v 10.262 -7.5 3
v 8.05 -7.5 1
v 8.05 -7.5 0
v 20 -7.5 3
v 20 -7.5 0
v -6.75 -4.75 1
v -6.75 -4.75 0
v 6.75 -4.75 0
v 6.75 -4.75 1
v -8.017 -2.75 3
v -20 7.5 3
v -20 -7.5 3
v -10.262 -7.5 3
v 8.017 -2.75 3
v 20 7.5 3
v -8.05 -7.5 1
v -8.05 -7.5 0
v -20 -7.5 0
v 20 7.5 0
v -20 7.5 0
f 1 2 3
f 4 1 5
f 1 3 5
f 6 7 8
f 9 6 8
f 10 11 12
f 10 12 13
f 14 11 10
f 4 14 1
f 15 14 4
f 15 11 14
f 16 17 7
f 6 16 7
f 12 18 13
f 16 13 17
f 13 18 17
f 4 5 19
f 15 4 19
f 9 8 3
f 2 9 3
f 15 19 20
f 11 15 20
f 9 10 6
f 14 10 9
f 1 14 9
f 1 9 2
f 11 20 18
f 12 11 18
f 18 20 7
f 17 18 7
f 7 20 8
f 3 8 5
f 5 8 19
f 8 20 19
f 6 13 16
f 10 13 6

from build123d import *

# Parameters (mm, degrees)
F1_DEPTH = 3
F2_SIZE  = 2


# Not quite as in the source:
# - a feature names something its author has since deleted; it is built from what else it names


with BuildPart() as f1:
    # F0 (on Top) → F1 (new body)
    with BuildSketch(Plane.XY):
        Polygon((8.05, -7.5), (20, -7.5), (20, 7.5), (-20, 7.5), (-20, -7.5), (-8.05, -7.5), (-6.75, -4.75), (0, -4.75), (6.75, -4.75), align=None)
    extrude(amount=F1_DEPTH)

    # F2
    f2_edges = [f1.edges().sort_by_distance(p)[0] for p in [
        (-7.4, -6.125, 3),
        (0, -4.75, 3),
        (7.4, -6.125, 3),
    ]]
    chamfer(f2_edges, length=F2_SIZE)


solid = f1.part
